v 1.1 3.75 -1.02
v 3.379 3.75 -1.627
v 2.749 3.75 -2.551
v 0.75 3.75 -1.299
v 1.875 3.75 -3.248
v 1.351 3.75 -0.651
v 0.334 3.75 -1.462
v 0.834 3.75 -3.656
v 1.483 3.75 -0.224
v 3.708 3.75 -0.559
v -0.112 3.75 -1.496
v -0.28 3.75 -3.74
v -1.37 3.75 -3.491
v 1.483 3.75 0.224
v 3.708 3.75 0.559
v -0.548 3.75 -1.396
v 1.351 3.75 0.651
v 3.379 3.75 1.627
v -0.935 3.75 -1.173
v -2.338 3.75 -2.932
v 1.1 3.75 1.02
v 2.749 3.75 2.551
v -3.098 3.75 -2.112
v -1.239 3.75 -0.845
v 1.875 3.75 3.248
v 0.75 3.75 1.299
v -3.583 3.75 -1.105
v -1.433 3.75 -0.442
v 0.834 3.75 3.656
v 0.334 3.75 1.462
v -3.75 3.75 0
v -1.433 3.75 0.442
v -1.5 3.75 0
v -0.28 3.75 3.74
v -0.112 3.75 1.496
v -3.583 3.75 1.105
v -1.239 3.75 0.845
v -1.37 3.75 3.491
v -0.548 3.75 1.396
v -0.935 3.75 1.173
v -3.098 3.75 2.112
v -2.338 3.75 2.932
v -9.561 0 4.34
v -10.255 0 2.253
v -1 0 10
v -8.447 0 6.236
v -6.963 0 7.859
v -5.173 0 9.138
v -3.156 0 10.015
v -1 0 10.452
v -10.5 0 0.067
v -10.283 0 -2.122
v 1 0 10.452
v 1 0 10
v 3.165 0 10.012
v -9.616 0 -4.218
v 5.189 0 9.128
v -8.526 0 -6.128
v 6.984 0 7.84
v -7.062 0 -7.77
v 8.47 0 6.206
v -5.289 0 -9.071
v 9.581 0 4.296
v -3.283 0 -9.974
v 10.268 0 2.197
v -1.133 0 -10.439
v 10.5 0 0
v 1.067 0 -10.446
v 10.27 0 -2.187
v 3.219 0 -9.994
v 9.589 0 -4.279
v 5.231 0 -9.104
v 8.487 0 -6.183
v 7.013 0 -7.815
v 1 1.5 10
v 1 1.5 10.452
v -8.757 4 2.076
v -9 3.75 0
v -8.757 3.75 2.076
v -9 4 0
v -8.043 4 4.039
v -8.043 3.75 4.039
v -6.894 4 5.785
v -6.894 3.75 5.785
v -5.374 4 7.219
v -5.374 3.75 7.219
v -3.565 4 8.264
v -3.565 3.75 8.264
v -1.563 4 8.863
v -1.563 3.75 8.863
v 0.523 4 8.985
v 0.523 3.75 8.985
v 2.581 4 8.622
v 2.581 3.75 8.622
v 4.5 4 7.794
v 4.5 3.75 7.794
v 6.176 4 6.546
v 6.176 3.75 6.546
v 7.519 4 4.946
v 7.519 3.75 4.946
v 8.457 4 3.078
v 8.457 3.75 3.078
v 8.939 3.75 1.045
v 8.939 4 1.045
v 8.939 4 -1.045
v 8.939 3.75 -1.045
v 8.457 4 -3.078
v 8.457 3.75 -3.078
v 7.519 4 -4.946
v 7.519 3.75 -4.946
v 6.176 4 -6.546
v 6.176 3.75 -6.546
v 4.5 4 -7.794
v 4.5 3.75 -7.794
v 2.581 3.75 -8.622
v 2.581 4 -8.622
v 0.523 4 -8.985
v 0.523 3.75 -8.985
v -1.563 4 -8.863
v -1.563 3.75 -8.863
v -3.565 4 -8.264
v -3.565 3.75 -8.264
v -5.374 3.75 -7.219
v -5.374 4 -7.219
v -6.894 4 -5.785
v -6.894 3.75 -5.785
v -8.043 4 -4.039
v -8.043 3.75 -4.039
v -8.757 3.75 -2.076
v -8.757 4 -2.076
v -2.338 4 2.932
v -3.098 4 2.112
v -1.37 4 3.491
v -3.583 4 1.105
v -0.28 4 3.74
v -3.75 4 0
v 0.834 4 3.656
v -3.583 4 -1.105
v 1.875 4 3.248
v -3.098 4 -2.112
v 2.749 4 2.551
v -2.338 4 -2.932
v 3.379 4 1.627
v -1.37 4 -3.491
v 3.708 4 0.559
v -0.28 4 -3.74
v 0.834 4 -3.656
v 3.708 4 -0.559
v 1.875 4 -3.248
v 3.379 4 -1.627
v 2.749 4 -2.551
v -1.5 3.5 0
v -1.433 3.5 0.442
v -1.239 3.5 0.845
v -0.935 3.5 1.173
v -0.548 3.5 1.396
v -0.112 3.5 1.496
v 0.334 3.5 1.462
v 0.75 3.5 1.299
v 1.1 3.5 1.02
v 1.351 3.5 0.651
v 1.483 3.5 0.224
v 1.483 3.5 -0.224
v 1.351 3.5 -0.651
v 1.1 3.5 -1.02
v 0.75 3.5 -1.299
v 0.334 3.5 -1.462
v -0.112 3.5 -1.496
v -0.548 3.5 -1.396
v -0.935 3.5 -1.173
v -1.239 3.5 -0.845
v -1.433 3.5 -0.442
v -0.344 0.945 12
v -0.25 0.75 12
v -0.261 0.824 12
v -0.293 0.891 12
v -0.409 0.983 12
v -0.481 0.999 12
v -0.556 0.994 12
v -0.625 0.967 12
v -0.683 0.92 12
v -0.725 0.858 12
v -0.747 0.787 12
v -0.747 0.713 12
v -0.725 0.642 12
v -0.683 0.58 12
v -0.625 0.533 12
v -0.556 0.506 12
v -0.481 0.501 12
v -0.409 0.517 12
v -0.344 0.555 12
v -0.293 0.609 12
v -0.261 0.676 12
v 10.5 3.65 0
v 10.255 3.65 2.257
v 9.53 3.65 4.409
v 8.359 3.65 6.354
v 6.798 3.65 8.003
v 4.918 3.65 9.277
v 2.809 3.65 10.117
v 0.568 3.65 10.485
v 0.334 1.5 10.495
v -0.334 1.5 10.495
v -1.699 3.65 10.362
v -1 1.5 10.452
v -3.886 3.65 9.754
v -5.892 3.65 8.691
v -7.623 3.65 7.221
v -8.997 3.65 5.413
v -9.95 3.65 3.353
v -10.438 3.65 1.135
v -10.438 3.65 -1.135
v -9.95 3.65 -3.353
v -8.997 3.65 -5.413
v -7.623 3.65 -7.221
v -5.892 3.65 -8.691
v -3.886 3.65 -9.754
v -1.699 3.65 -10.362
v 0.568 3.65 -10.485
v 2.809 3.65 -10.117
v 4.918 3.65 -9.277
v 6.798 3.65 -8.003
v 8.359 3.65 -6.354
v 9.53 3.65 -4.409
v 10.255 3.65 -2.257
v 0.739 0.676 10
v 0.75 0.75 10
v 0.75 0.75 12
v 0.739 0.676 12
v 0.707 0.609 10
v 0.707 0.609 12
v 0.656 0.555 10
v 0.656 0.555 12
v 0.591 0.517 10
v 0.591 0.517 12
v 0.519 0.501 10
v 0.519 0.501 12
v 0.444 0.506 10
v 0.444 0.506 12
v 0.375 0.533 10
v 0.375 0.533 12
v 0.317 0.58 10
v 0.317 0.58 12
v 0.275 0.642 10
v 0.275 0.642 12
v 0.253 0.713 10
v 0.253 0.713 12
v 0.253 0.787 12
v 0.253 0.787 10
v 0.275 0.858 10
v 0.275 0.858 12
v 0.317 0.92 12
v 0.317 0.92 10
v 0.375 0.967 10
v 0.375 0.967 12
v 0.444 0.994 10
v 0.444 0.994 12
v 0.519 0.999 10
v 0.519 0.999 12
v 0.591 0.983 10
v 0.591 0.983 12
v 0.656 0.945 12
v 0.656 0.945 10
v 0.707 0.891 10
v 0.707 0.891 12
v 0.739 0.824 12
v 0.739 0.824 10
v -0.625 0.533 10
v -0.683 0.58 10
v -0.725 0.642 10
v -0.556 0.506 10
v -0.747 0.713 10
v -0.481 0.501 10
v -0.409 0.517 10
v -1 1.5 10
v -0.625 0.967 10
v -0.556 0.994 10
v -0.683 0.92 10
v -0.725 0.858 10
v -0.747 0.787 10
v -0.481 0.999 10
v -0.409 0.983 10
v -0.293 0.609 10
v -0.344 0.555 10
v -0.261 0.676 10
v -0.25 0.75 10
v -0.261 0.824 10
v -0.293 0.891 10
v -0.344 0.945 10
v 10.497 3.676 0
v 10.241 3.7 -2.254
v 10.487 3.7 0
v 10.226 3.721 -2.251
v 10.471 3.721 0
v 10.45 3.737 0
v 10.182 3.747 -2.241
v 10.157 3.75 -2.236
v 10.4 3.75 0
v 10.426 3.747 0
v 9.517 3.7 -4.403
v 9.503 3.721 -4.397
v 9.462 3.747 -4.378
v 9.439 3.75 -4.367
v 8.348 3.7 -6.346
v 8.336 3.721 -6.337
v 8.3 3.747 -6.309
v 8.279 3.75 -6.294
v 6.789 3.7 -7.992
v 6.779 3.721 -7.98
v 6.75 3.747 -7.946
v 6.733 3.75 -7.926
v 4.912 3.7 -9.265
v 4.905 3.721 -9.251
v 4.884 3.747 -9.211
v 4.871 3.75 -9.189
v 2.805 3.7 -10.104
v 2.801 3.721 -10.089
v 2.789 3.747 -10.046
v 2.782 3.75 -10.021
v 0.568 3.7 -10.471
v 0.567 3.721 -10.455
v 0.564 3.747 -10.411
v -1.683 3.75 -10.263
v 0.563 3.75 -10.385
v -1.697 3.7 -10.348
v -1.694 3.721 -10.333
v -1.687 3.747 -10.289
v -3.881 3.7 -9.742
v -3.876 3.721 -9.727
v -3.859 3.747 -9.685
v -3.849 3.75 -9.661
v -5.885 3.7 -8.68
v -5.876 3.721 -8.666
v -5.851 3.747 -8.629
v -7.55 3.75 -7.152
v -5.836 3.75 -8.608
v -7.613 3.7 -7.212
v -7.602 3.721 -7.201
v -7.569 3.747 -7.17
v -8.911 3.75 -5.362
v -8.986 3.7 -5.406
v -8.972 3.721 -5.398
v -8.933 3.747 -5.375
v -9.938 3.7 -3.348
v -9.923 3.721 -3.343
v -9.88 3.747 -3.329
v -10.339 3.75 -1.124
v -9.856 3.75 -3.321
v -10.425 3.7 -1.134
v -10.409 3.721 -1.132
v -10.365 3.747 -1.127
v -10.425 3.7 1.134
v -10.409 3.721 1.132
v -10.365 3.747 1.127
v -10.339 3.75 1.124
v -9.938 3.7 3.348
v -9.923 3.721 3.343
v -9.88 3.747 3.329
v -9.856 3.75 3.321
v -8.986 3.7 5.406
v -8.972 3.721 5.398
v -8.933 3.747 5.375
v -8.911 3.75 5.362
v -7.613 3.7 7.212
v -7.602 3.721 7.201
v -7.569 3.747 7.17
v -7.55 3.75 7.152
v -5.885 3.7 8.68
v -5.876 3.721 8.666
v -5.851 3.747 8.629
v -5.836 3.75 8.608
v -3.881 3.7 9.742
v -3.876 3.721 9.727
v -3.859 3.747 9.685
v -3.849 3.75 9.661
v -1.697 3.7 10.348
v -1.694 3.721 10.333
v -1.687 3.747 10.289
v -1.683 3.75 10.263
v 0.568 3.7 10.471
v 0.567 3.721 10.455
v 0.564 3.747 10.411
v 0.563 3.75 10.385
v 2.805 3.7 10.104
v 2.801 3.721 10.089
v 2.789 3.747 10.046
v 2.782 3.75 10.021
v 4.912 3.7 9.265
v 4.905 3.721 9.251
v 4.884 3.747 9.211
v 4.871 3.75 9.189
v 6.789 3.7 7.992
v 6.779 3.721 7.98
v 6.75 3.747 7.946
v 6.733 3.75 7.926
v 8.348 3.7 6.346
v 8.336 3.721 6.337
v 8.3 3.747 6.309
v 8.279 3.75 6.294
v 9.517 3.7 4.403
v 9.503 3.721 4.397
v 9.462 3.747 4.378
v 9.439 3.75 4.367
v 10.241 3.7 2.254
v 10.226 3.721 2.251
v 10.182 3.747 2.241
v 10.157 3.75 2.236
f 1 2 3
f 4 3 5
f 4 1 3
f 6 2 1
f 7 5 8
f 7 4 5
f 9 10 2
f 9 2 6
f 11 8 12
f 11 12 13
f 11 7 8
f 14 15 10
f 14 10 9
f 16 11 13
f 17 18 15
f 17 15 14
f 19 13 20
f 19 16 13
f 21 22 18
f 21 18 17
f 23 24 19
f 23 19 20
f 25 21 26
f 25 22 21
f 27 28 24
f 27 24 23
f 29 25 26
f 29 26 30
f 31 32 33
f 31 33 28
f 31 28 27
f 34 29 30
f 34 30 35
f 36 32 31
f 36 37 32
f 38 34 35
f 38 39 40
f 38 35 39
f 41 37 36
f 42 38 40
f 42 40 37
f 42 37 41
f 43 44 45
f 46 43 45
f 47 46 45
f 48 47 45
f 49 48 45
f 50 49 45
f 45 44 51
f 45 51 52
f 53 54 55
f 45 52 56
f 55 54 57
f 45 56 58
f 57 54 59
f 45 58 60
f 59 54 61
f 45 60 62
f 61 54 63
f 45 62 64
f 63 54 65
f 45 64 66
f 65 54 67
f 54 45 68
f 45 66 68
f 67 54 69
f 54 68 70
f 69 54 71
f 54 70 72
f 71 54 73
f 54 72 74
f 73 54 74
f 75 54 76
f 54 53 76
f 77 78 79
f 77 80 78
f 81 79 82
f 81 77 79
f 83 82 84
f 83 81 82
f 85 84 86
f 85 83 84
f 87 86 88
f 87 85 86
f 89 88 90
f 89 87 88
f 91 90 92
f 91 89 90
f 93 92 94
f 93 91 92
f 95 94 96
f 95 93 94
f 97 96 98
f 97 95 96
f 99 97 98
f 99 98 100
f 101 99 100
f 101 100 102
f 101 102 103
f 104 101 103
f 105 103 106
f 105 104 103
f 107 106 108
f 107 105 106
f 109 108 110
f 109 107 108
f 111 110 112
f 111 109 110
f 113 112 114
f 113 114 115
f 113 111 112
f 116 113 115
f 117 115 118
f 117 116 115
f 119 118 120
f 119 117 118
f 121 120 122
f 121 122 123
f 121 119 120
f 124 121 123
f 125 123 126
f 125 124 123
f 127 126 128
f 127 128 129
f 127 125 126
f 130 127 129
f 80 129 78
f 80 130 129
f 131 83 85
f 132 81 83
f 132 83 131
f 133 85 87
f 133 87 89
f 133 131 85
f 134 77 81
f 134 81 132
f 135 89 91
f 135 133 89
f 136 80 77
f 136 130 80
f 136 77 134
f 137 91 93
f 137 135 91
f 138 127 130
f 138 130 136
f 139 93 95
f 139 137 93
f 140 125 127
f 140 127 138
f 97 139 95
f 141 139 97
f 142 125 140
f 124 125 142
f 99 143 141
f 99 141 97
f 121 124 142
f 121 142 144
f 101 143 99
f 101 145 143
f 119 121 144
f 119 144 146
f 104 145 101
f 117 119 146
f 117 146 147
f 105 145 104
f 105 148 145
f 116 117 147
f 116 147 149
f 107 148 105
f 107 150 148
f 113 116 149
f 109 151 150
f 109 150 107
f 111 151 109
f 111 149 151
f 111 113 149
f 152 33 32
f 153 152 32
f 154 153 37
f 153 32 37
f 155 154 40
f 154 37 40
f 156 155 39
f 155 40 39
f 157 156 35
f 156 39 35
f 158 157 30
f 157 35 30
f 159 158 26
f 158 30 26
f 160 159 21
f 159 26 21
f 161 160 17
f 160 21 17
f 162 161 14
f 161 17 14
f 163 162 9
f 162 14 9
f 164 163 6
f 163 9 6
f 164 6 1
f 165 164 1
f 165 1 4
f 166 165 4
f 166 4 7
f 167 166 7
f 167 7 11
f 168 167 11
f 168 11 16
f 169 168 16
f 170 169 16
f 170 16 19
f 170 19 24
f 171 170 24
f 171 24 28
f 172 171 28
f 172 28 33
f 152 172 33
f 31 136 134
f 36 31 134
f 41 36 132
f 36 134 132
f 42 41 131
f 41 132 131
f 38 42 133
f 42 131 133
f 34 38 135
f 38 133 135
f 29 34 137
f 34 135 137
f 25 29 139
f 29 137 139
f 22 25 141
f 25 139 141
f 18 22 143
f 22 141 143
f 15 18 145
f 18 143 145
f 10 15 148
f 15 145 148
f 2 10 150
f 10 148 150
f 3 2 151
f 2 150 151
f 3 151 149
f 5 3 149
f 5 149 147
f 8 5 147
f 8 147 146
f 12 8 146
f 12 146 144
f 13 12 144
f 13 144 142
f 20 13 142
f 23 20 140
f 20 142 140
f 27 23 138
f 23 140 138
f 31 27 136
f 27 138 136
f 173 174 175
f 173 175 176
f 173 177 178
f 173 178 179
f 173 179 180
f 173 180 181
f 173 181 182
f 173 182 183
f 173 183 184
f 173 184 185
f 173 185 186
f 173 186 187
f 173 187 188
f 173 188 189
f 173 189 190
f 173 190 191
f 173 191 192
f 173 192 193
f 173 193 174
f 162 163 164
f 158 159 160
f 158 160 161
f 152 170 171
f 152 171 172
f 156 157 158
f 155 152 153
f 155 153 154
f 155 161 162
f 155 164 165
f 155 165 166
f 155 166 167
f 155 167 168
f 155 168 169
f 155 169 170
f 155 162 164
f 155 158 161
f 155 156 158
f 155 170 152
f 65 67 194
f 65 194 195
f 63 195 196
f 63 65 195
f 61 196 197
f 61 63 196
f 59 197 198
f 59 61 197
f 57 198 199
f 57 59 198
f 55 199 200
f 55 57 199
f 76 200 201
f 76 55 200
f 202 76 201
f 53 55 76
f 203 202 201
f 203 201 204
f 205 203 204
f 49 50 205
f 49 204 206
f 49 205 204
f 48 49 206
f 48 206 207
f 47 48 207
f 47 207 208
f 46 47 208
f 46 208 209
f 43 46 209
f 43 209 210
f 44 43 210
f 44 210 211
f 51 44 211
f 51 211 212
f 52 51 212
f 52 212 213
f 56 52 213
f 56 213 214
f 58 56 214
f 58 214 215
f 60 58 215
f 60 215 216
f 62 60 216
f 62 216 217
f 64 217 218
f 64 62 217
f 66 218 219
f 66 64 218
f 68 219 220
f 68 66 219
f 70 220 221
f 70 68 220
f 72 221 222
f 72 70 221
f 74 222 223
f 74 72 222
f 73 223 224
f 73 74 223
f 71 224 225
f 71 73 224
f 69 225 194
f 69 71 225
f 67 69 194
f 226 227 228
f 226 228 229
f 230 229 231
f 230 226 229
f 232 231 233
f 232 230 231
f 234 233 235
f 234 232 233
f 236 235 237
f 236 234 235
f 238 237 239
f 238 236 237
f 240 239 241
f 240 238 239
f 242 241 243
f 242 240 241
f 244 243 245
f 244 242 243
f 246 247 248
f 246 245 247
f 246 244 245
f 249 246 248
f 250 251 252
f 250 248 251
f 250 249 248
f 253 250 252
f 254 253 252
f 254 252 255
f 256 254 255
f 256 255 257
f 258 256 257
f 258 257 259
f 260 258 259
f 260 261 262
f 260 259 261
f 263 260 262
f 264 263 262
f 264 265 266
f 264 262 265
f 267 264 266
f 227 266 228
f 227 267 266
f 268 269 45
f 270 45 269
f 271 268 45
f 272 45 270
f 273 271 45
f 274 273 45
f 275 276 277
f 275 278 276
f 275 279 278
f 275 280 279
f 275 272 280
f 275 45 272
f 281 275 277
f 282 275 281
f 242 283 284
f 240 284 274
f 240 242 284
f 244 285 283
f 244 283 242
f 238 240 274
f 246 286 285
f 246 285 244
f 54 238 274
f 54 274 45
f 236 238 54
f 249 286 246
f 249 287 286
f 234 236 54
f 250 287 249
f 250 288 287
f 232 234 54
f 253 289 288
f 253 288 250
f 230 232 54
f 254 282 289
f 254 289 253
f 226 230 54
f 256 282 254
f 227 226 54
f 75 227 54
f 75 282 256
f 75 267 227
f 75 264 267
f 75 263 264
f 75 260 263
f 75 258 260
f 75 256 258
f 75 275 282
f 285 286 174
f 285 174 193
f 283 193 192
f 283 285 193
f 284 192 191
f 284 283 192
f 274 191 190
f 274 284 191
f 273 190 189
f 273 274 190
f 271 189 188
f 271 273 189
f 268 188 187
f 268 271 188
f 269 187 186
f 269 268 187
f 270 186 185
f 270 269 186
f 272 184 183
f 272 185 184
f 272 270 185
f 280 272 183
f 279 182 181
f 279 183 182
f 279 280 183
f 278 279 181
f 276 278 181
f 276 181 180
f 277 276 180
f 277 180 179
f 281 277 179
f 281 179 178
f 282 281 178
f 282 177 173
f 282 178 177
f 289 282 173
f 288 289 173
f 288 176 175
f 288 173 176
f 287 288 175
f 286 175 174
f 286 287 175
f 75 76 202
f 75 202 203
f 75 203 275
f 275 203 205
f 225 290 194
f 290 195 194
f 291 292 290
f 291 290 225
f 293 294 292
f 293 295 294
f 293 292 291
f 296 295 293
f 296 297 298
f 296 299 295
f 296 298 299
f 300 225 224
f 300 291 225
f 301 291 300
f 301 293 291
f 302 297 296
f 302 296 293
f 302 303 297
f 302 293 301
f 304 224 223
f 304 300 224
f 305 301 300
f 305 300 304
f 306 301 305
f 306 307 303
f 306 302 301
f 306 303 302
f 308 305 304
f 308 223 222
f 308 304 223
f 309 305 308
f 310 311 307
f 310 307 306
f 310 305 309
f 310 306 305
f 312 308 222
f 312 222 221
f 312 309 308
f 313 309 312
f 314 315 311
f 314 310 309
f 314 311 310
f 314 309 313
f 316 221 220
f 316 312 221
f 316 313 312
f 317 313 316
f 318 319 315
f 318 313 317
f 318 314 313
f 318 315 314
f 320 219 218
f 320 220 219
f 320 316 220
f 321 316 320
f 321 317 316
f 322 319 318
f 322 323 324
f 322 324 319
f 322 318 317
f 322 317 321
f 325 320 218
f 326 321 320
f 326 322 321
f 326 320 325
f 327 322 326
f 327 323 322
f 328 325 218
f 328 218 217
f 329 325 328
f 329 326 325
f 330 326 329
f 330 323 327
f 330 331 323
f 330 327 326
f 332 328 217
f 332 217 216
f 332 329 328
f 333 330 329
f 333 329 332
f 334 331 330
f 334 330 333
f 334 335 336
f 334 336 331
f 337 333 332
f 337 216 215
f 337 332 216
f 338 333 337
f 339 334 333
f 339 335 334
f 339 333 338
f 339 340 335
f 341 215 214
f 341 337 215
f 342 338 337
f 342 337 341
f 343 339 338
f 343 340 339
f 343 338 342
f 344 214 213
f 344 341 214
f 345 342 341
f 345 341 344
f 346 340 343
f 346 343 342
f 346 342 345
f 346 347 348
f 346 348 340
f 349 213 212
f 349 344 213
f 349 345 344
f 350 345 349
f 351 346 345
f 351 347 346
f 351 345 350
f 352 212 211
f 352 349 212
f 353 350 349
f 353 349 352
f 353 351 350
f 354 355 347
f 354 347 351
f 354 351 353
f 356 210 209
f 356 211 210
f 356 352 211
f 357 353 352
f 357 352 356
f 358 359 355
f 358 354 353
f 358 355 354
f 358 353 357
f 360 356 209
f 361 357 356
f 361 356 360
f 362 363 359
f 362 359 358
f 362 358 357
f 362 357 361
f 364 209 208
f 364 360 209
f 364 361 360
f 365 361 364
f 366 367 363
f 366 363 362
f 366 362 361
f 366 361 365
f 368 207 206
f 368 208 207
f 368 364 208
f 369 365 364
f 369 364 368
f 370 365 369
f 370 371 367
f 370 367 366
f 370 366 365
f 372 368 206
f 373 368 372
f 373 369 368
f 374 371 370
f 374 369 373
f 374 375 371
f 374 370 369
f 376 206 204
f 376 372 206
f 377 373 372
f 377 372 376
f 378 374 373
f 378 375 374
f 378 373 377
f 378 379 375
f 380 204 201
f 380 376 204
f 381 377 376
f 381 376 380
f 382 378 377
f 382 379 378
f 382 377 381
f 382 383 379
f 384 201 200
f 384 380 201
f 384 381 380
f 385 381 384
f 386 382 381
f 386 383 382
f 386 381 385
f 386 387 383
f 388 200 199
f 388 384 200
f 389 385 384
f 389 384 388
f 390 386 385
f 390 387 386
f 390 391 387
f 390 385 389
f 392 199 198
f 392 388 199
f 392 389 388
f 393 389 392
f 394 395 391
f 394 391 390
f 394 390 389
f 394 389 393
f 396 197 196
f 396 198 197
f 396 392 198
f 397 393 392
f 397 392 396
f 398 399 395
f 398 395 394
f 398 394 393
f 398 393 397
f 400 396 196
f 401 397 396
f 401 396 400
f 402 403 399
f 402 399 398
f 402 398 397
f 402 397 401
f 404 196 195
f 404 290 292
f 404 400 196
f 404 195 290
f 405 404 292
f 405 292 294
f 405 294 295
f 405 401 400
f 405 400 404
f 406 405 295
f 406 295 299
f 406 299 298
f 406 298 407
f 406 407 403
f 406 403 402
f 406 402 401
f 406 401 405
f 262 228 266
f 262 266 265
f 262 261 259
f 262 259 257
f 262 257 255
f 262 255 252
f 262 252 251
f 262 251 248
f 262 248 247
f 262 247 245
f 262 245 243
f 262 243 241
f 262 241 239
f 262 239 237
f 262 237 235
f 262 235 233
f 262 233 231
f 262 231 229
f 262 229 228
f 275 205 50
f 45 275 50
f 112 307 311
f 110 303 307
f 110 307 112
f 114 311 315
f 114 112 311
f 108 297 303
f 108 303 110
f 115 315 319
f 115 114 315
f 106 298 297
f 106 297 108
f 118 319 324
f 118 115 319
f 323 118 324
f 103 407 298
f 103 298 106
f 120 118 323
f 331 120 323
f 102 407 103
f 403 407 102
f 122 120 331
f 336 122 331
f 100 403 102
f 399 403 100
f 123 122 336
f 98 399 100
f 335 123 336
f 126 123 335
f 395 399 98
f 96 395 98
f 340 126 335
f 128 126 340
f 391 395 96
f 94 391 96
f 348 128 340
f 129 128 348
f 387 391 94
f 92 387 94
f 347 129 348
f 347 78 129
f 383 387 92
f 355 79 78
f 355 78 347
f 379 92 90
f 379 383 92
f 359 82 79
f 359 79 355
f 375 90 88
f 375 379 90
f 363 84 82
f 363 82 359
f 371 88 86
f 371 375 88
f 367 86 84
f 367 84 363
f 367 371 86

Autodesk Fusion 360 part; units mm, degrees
sketch "Sketch1" plane through (0, 0, 0) normal (0, 1, 0) x (1, 0, 0)
  circle A0 centre (0, 0) radius 10.5
  dimension "d1" = 21
extrude "Extrude1" add sketch "Sketch1" along normal blind 4
sketch "Sketch2" plane through (0, 4, 0) normal (0, 1, 0) x (-1, 0, 0)
  circle A0 centre (0, 0) radius 10.5
  circle A1 centre (0, 0) radius 1.5
  dimension "d4" = 3
extrude "Extrude2" cut sketch "Sketch2" against normal blind 0.5 contours A1
sketch "Sketch3" plane through (0, 4, 0) normal (0, 1, 0) x (-1, 0, 0)
  circle A0 centre (0, 0) radius 1.5
  circle A1 centre (0, 0) radius 10.5
  circle A2 centre (0, 0) radius 9
  circle A3 centre (0, 0) radius 3.75
  dimension "d7" = 1.5
  dimension "d20" = 7.5
extrude "Extrude3" cut sketch "Sketch3" against normal blind 0.25
fillet "Fillet1" radius 0.1 1 edges at (-9.7894, 3.75, -3.797)
ref_plane "WorkPlane1" through (0, 0, 10.5) normal (0, 0, 1) x (1, 0, 0)
sketch "Sketch4" plane through (0, 0, 10.5) normal (0, 0, 1) x (1, 0, 0)
  line L0 (-1, 0) -> (1, 0)
  line L1 (1, 0) -> (1, 1.5)
  line L2 (1, 1.5) -> (-1, 1.5)
  line L3 (-1, 1.5) -> (-1, 0)
  line L4 (10.5, 0) -> (-10.5, 0)
  dimension "d12" = 1.5
  dimension "d13" = 2
extrude "Extrude4" cut sketch "Sketch4" against normal blind 0.5
sketch "Sketch5" plane through (0, 0, 10) normal (0, 0, 1) x (1, 0, 0)
  line L0 (1, 0) -> (1, 1.5)
  line L1 (1, 1.5) -> (-1, 1.5)
  line L2 (-1, 1.5) -> (-1, 0)
  line L3 (-1, 0) -> (1, 0)
  line L4 (9, 4) -> (-9, 4)
  line L5 (0, 1.5) -> (0, 0) construction
  line L6 (0, 0.75) -> (-1, 0.75) construction
  circle A0 centre (-0.5, 0.75) radius 0.25
  circle A1 centre (0.5, 0.75) radius 0.25
  dimension "d16" = 0.5
extrude "Extrude5" add sketch "Sketch5" along normal blind 2 contours A0 | A1
